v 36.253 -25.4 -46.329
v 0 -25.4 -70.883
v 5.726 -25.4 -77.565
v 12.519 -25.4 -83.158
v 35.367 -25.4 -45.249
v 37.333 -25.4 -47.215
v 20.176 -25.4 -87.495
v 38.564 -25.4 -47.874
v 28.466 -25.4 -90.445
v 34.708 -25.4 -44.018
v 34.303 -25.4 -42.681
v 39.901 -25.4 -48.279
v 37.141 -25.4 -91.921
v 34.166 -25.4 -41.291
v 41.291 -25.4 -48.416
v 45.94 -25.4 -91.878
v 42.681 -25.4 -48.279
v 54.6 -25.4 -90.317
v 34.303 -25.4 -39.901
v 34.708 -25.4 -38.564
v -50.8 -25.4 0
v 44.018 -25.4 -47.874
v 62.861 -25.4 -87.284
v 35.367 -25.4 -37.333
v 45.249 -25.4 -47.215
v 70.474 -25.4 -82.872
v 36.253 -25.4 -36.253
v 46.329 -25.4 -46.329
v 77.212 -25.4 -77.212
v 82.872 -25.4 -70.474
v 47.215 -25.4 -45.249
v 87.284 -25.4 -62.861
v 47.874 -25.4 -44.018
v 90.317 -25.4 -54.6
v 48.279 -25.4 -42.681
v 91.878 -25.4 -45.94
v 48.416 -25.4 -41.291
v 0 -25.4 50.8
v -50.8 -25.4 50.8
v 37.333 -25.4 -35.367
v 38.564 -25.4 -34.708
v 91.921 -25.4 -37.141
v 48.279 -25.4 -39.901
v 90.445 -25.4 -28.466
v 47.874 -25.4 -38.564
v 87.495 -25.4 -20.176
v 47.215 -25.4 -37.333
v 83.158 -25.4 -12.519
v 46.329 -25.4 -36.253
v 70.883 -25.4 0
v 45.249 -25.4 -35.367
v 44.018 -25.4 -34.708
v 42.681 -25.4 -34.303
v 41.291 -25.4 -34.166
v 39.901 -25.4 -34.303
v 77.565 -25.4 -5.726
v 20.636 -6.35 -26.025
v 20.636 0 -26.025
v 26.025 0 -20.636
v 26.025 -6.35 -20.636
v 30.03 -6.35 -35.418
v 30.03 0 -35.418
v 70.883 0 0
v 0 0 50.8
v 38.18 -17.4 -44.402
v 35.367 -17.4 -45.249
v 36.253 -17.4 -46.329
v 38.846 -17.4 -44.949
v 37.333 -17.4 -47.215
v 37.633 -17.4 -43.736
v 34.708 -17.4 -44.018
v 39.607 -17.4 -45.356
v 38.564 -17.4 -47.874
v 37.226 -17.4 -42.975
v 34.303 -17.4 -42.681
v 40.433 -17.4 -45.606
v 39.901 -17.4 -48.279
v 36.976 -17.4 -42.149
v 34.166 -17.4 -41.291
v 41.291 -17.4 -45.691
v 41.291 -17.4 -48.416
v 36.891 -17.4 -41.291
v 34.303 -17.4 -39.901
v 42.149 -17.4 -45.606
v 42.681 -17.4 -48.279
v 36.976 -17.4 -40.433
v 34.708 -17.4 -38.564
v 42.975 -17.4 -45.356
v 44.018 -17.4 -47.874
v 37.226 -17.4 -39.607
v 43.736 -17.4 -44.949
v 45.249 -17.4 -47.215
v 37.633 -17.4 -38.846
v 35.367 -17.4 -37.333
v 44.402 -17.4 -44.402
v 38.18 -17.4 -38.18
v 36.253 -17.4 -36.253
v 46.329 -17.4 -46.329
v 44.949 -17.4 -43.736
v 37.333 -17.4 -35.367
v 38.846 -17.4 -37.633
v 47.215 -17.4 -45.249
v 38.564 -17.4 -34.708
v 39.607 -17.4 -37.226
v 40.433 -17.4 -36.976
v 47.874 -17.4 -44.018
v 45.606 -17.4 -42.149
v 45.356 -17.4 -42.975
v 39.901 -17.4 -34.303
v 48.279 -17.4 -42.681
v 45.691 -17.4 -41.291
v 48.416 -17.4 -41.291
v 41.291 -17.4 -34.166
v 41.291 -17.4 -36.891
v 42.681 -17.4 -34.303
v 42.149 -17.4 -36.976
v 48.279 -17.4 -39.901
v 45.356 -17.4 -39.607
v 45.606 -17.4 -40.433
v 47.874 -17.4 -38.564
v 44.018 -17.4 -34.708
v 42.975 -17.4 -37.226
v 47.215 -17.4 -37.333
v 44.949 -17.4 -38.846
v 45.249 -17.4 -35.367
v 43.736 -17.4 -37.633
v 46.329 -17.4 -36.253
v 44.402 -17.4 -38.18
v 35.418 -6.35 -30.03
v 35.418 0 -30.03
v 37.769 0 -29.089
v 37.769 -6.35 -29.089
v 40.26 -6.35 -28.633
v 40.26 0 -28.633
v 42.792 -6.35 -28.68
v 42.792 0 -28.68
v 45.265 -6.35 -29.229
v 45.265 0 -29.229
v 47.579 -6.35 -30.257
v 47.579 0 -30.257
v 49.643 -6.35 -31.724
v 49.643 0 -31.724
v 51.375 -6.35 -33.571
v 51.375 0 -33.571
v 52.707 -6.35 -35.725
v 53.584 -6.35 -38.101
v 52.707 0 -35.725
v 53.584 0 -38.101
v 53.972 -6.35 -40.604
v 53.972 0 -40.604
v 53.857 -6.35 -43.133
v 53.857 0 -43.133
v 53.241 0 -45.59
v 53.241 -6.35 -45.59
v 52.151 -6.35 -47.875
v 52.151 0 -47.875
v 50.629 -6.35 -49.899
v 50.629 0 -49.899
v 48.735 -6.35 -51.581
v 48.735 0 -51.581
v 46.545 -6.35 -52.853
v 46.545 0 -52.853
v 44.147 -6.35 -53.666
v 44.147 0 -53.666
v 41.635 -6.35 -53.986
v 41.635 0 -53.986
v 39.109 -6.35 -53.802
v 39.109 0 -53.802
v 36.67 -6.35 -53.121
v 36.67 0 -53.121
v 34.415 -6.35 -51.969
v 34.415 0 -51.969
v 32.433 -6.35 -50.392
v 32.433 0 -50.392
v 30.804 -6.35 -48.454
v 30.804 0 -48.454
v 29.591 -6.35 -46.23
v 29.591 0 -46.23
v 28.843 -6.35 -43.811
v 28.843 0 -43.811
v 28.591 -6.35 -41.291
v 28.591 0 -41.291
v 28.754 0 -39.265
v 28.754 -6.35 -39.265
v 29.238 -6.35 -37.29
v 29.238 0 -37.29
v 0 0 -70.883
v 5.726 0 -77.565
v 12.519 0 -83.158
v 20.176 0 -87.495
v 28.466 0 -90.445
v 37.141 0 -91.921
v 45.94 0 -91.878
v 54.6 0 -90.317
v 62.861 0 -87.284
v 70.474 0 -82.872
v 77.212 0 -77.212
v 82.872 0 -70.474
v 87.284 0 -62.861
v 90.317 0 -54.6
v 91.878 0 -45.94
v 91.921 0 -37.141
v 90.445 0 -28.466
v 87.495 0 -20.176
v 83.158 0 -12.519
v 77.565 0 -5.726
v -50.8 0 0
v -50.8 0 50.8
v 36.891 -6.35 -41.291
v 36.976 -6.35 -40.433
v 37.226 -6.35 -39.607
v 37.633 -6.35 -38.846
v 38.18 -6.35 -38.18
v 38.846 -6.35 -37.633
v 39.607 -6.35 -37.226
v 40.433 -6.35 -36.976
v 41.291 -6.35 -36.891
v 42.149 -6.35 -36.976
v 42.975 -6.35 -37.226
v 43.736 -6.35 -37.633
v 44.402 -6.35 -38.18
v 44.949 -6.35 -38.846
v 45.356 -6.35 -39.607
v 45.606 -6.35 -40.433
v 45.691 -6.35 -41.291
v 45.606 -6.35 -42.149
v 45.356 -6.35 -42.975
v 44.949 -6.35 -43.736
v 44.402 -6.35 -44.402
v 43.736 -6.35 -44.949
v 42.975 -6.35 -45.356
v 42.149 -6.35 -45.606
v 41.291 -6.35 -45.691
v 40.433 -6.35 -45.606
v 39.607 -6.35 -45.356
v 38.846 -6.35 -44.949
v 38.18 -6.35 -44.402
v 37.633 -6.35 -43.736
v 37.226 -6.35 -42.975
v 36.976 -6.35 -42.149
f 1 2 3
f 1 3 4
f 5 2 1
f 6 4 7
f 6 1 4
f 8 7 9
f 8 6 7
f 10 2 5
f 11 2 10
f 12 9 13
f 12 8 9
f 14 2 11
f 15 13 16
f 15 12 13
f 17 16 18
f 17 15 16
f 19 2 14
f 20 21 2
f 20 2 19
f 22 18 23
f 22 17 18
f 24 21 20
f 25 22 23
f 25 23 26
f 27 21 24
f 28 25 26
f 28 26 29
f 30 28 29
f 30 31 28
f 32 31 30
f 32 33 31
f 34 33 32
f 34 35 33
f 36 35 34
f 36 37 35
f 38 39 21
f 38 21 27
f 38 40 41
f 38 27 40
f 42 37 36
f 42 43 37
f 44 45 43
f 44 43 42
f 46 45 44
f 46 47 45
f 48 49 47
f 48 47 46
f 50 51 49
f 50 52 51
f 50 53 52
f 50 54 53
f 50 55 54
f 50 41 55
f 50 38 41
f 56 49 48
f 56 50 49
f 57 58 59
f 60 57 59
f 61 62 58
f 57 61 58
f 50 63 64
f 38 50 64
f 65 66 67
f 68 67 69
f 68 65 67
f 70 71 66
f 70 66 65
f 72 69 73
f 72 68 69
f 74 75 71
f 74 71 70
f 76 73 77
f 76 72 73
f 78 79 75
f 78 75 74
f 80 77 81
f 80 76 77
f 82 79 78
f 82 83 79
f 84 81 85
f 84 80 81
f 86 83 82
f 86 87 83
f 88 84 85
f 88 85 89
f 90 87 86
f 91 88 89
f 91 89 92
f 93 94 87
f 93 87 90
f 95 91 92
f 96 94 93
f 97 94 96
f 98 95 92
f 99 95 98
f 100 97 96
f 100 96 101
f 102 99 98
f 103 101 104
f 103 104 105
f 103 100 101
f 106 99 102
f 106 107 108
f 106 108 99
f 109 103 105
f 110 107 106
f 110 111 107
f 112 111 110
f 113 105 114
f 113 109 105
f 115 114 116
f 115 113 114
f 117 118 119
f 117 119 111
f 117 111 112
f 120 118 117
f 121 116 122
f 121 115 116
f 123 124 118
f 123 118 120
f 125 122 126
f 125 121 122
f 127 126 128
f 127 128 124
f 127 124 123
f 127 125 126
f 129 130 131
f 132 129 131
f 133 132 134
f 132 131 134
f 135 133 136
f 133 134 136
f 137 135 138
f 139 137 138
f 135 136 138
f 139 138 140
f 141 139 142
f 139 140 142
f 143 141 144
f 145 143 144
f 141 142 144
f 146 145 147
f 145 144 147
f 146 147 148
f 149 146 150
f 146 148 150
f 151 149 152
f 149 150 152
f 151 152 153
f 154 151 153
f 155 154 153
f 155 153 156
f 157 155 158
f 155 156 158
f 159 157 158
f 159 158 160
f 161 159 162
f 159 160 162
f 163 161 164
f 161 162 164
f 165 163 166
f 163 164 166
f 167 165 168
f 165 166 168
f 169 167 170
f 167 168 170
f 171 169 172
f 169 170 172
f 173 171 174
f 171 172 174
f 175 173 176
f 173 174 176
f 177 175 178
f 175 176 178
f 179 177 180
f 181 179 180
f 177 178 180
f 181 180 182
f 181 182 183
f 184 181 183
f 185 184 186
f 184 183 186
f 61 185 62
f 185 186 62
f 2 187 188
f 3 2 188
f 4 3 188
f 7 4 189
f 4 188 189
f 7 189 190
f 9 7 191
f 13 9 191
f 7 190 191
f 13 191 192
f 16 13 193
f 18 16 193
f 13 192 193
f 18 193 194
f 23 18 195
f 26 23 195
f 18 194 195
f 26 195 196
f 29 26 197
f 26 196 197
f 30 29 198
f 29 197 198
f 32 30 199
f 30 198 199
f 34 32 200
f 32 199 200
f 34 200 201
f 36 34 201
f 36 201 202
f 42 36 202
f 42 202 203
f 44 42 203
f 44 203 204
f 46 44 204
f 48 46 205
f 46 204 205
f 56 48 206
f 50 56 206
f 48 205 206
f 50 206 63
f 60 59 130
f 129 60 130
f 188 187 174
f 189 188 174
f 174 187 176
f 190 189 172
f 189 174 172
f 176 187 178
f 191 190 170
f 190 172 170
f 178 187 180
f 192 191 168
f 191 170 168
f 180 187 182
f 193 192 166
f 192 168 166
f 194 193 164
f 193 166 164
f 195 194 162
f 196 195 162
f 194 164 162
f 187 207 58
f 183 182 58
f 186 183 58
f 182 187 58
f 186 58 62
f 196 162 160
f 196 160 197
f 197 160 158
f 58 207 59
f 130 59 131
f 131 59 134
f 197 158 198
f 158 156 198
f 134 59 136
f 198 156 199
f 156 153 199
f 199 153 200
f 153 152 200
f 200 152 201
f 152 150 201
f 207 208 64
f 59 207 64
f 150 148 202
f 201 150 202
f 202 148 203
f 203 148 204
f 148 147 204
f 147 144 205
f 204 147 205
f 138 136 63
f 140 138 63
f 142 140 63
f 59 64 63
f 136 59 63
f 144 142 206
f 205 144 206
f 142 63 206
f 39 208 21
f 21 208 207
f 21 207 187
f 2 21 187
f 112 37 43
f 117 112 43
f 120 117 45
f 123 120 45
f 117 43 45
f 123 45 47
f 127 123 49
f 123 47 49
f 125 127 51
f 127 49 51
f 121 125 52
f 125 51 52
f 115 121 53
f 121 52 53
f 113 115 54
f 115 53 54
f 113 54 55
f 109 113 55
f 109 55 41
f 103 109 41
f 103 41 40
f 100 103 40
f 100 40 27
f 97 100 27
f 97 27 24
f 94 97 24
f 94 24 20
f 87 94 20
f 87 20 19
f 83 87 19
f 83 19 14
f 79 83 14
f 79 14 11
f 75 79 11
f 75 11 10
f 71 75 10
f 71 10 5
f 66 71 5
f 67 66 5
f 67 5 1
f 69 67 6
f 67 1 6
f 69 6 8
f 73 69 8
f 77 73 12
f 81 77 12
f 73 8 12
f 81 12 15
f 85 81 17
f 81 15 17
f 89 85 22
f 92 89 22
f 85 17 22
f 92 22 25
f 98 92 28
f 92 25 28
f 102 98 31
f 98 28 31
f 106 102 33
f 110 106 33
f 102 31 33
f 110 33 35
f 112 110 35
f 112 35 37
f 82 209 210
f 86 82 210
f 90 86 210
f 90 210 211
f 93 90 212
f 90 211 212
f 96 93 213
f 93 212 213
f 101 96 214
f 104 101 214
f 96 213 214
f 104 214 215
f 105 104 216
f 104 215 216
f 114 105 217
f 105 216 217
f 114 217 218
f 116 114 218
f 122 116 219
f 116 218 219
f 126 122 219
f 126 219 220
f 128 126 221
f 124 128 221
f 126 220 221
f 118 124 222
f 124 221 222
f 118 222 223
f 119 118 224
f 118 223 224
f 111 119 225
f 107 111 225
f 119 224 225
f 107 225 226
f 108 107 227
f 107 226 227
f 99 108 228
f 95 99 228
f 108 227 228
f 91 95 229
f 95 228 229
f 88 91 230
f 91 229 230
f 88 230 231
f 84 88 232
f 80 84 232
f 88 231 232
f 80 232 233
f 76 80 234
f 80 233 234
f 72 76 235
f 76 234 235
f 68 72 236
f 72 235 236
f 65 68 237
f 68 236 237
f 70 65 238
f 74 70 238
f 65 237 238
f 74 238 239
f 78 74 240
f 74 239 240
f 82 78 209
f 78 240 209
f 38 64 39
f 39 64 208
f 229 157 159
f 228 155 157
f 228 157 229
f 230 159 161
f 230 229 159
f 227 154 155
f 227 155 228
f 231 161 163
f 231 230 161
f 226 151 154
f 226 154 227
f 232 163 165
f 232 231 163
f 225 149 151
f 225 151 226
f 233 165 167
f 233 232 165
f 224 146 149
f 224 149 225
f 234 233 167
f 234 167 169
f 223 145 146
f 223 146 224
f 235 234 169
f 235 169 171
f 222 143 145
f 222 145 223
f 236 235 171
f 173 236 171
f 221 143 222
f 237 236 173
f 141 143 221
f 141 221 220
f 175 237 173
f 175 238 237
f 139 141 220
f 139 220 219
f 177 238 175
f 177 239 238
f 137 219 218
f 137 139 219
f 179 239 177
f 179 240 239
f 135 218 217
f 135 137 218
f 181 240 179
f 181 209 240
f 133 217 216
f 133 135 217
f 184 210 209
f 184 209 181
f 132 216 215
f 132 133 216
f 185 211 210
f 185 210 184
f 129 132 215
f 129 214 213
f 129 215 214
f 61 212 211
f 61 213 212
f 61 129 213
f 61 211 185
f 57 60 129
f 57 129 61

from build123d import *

# Parameters (mm, degrees)
F1_DEPTH       = 25.4
F3_D           = 8.8
F3_CBORE_D     = 14.25
F3_CBORE_DEPTH = 8
F5_DEPTH       = 6.35


with BuildPart() as f1:
    # F0 (on Front) → F1 (new body)
    with BuildSketch(Plane.XZ):
        with BuildLine():
            Line((-50.8, 50.8), (-50.8, 0))
            Line((-50.8, 0), (0, -70.8831193189))
            ThreePointArc((0, -70.8831193189), (77.2120156464, -77.2120156464), (70.8831193189, 0))
            Line((70.8831193189, 0), (0, 50.8))
            Line((0, 50.8), (-50.8, 50.8))
        make_face()
    extrude(amount=F1_DEPTH)

    # F3 (through all)
    with Locations(Plane.XZ.offset(25.4)):
        with Locations((41.2909911622, -41.2909911622)):
            CounterBoreHole(F3_D / 2, F3_CBORE_D / 2, F3_CBORE_DEPTH)

    # F4 (on face) → F5 (cut)
    with BuildSketch(Plane(origin=(0, 0, 0), x_dir=(-1, 0, 0), z_dir=(0, 1, 0))):
        with BuildLine():
            ThreePointArc((-35.4184496458, -30.0302959732), (-52.150808777, -47.8753940486), (-28.5909911622, -41.2909911622))
            ThreePointArc((-28.5909911622, -41.2909911622), (-28.9560645531, -38.2678164153), (-30.0302959732, -35.4184496458))
            Line((-30.0302959732, -35.4184496458), (-38.5969143258, -43.9850679985))
            Line((-38.5969143258, -43.9850679985), (-43.9850679985, -38.5969143258))
            Line((-43.9850679985, -38.5969143258), (-35.4184496458, -30.0302959732))
        make_face()
        with BuildLine():
            Line((-38.5969143258, -43.9850679985), (-30.0302959732, -35.4184496458))
            ThreePointArc((-30.0302959732, -35.4184496458), (-32.3107350411, -32.3107350411), (-35.4184496458, -30.0302959732))
            Line((-35.4184496458, -30.0302959732), (-43.9850679985, -38.5969143258))
            Line((-43.9850679985, -38.5969143258), (-38.5969143258, -43.9850679985))
        make_face()
        with BuildLine():
            ThreePointArc((-35.4184496458, -30.0302959732), (-32.3107350411, -32.3107350411), (-30.0302959732, -35.4184496458))
            Line((-30.0302959732, -35.4184496458), (-20.6364020837, -26.0245557563))
            Line((-20.6364020837, -26.0245557563), (-26.0245557563, -20.6364020837))
            Line((-26.0245557563, -20.6364020837), (-35.4184496458, -30.0302959732))
        make_face()
    extrude(amount=-F5_DEPTH, mode=Mode.SUBTRACT)


solid = f1.part
